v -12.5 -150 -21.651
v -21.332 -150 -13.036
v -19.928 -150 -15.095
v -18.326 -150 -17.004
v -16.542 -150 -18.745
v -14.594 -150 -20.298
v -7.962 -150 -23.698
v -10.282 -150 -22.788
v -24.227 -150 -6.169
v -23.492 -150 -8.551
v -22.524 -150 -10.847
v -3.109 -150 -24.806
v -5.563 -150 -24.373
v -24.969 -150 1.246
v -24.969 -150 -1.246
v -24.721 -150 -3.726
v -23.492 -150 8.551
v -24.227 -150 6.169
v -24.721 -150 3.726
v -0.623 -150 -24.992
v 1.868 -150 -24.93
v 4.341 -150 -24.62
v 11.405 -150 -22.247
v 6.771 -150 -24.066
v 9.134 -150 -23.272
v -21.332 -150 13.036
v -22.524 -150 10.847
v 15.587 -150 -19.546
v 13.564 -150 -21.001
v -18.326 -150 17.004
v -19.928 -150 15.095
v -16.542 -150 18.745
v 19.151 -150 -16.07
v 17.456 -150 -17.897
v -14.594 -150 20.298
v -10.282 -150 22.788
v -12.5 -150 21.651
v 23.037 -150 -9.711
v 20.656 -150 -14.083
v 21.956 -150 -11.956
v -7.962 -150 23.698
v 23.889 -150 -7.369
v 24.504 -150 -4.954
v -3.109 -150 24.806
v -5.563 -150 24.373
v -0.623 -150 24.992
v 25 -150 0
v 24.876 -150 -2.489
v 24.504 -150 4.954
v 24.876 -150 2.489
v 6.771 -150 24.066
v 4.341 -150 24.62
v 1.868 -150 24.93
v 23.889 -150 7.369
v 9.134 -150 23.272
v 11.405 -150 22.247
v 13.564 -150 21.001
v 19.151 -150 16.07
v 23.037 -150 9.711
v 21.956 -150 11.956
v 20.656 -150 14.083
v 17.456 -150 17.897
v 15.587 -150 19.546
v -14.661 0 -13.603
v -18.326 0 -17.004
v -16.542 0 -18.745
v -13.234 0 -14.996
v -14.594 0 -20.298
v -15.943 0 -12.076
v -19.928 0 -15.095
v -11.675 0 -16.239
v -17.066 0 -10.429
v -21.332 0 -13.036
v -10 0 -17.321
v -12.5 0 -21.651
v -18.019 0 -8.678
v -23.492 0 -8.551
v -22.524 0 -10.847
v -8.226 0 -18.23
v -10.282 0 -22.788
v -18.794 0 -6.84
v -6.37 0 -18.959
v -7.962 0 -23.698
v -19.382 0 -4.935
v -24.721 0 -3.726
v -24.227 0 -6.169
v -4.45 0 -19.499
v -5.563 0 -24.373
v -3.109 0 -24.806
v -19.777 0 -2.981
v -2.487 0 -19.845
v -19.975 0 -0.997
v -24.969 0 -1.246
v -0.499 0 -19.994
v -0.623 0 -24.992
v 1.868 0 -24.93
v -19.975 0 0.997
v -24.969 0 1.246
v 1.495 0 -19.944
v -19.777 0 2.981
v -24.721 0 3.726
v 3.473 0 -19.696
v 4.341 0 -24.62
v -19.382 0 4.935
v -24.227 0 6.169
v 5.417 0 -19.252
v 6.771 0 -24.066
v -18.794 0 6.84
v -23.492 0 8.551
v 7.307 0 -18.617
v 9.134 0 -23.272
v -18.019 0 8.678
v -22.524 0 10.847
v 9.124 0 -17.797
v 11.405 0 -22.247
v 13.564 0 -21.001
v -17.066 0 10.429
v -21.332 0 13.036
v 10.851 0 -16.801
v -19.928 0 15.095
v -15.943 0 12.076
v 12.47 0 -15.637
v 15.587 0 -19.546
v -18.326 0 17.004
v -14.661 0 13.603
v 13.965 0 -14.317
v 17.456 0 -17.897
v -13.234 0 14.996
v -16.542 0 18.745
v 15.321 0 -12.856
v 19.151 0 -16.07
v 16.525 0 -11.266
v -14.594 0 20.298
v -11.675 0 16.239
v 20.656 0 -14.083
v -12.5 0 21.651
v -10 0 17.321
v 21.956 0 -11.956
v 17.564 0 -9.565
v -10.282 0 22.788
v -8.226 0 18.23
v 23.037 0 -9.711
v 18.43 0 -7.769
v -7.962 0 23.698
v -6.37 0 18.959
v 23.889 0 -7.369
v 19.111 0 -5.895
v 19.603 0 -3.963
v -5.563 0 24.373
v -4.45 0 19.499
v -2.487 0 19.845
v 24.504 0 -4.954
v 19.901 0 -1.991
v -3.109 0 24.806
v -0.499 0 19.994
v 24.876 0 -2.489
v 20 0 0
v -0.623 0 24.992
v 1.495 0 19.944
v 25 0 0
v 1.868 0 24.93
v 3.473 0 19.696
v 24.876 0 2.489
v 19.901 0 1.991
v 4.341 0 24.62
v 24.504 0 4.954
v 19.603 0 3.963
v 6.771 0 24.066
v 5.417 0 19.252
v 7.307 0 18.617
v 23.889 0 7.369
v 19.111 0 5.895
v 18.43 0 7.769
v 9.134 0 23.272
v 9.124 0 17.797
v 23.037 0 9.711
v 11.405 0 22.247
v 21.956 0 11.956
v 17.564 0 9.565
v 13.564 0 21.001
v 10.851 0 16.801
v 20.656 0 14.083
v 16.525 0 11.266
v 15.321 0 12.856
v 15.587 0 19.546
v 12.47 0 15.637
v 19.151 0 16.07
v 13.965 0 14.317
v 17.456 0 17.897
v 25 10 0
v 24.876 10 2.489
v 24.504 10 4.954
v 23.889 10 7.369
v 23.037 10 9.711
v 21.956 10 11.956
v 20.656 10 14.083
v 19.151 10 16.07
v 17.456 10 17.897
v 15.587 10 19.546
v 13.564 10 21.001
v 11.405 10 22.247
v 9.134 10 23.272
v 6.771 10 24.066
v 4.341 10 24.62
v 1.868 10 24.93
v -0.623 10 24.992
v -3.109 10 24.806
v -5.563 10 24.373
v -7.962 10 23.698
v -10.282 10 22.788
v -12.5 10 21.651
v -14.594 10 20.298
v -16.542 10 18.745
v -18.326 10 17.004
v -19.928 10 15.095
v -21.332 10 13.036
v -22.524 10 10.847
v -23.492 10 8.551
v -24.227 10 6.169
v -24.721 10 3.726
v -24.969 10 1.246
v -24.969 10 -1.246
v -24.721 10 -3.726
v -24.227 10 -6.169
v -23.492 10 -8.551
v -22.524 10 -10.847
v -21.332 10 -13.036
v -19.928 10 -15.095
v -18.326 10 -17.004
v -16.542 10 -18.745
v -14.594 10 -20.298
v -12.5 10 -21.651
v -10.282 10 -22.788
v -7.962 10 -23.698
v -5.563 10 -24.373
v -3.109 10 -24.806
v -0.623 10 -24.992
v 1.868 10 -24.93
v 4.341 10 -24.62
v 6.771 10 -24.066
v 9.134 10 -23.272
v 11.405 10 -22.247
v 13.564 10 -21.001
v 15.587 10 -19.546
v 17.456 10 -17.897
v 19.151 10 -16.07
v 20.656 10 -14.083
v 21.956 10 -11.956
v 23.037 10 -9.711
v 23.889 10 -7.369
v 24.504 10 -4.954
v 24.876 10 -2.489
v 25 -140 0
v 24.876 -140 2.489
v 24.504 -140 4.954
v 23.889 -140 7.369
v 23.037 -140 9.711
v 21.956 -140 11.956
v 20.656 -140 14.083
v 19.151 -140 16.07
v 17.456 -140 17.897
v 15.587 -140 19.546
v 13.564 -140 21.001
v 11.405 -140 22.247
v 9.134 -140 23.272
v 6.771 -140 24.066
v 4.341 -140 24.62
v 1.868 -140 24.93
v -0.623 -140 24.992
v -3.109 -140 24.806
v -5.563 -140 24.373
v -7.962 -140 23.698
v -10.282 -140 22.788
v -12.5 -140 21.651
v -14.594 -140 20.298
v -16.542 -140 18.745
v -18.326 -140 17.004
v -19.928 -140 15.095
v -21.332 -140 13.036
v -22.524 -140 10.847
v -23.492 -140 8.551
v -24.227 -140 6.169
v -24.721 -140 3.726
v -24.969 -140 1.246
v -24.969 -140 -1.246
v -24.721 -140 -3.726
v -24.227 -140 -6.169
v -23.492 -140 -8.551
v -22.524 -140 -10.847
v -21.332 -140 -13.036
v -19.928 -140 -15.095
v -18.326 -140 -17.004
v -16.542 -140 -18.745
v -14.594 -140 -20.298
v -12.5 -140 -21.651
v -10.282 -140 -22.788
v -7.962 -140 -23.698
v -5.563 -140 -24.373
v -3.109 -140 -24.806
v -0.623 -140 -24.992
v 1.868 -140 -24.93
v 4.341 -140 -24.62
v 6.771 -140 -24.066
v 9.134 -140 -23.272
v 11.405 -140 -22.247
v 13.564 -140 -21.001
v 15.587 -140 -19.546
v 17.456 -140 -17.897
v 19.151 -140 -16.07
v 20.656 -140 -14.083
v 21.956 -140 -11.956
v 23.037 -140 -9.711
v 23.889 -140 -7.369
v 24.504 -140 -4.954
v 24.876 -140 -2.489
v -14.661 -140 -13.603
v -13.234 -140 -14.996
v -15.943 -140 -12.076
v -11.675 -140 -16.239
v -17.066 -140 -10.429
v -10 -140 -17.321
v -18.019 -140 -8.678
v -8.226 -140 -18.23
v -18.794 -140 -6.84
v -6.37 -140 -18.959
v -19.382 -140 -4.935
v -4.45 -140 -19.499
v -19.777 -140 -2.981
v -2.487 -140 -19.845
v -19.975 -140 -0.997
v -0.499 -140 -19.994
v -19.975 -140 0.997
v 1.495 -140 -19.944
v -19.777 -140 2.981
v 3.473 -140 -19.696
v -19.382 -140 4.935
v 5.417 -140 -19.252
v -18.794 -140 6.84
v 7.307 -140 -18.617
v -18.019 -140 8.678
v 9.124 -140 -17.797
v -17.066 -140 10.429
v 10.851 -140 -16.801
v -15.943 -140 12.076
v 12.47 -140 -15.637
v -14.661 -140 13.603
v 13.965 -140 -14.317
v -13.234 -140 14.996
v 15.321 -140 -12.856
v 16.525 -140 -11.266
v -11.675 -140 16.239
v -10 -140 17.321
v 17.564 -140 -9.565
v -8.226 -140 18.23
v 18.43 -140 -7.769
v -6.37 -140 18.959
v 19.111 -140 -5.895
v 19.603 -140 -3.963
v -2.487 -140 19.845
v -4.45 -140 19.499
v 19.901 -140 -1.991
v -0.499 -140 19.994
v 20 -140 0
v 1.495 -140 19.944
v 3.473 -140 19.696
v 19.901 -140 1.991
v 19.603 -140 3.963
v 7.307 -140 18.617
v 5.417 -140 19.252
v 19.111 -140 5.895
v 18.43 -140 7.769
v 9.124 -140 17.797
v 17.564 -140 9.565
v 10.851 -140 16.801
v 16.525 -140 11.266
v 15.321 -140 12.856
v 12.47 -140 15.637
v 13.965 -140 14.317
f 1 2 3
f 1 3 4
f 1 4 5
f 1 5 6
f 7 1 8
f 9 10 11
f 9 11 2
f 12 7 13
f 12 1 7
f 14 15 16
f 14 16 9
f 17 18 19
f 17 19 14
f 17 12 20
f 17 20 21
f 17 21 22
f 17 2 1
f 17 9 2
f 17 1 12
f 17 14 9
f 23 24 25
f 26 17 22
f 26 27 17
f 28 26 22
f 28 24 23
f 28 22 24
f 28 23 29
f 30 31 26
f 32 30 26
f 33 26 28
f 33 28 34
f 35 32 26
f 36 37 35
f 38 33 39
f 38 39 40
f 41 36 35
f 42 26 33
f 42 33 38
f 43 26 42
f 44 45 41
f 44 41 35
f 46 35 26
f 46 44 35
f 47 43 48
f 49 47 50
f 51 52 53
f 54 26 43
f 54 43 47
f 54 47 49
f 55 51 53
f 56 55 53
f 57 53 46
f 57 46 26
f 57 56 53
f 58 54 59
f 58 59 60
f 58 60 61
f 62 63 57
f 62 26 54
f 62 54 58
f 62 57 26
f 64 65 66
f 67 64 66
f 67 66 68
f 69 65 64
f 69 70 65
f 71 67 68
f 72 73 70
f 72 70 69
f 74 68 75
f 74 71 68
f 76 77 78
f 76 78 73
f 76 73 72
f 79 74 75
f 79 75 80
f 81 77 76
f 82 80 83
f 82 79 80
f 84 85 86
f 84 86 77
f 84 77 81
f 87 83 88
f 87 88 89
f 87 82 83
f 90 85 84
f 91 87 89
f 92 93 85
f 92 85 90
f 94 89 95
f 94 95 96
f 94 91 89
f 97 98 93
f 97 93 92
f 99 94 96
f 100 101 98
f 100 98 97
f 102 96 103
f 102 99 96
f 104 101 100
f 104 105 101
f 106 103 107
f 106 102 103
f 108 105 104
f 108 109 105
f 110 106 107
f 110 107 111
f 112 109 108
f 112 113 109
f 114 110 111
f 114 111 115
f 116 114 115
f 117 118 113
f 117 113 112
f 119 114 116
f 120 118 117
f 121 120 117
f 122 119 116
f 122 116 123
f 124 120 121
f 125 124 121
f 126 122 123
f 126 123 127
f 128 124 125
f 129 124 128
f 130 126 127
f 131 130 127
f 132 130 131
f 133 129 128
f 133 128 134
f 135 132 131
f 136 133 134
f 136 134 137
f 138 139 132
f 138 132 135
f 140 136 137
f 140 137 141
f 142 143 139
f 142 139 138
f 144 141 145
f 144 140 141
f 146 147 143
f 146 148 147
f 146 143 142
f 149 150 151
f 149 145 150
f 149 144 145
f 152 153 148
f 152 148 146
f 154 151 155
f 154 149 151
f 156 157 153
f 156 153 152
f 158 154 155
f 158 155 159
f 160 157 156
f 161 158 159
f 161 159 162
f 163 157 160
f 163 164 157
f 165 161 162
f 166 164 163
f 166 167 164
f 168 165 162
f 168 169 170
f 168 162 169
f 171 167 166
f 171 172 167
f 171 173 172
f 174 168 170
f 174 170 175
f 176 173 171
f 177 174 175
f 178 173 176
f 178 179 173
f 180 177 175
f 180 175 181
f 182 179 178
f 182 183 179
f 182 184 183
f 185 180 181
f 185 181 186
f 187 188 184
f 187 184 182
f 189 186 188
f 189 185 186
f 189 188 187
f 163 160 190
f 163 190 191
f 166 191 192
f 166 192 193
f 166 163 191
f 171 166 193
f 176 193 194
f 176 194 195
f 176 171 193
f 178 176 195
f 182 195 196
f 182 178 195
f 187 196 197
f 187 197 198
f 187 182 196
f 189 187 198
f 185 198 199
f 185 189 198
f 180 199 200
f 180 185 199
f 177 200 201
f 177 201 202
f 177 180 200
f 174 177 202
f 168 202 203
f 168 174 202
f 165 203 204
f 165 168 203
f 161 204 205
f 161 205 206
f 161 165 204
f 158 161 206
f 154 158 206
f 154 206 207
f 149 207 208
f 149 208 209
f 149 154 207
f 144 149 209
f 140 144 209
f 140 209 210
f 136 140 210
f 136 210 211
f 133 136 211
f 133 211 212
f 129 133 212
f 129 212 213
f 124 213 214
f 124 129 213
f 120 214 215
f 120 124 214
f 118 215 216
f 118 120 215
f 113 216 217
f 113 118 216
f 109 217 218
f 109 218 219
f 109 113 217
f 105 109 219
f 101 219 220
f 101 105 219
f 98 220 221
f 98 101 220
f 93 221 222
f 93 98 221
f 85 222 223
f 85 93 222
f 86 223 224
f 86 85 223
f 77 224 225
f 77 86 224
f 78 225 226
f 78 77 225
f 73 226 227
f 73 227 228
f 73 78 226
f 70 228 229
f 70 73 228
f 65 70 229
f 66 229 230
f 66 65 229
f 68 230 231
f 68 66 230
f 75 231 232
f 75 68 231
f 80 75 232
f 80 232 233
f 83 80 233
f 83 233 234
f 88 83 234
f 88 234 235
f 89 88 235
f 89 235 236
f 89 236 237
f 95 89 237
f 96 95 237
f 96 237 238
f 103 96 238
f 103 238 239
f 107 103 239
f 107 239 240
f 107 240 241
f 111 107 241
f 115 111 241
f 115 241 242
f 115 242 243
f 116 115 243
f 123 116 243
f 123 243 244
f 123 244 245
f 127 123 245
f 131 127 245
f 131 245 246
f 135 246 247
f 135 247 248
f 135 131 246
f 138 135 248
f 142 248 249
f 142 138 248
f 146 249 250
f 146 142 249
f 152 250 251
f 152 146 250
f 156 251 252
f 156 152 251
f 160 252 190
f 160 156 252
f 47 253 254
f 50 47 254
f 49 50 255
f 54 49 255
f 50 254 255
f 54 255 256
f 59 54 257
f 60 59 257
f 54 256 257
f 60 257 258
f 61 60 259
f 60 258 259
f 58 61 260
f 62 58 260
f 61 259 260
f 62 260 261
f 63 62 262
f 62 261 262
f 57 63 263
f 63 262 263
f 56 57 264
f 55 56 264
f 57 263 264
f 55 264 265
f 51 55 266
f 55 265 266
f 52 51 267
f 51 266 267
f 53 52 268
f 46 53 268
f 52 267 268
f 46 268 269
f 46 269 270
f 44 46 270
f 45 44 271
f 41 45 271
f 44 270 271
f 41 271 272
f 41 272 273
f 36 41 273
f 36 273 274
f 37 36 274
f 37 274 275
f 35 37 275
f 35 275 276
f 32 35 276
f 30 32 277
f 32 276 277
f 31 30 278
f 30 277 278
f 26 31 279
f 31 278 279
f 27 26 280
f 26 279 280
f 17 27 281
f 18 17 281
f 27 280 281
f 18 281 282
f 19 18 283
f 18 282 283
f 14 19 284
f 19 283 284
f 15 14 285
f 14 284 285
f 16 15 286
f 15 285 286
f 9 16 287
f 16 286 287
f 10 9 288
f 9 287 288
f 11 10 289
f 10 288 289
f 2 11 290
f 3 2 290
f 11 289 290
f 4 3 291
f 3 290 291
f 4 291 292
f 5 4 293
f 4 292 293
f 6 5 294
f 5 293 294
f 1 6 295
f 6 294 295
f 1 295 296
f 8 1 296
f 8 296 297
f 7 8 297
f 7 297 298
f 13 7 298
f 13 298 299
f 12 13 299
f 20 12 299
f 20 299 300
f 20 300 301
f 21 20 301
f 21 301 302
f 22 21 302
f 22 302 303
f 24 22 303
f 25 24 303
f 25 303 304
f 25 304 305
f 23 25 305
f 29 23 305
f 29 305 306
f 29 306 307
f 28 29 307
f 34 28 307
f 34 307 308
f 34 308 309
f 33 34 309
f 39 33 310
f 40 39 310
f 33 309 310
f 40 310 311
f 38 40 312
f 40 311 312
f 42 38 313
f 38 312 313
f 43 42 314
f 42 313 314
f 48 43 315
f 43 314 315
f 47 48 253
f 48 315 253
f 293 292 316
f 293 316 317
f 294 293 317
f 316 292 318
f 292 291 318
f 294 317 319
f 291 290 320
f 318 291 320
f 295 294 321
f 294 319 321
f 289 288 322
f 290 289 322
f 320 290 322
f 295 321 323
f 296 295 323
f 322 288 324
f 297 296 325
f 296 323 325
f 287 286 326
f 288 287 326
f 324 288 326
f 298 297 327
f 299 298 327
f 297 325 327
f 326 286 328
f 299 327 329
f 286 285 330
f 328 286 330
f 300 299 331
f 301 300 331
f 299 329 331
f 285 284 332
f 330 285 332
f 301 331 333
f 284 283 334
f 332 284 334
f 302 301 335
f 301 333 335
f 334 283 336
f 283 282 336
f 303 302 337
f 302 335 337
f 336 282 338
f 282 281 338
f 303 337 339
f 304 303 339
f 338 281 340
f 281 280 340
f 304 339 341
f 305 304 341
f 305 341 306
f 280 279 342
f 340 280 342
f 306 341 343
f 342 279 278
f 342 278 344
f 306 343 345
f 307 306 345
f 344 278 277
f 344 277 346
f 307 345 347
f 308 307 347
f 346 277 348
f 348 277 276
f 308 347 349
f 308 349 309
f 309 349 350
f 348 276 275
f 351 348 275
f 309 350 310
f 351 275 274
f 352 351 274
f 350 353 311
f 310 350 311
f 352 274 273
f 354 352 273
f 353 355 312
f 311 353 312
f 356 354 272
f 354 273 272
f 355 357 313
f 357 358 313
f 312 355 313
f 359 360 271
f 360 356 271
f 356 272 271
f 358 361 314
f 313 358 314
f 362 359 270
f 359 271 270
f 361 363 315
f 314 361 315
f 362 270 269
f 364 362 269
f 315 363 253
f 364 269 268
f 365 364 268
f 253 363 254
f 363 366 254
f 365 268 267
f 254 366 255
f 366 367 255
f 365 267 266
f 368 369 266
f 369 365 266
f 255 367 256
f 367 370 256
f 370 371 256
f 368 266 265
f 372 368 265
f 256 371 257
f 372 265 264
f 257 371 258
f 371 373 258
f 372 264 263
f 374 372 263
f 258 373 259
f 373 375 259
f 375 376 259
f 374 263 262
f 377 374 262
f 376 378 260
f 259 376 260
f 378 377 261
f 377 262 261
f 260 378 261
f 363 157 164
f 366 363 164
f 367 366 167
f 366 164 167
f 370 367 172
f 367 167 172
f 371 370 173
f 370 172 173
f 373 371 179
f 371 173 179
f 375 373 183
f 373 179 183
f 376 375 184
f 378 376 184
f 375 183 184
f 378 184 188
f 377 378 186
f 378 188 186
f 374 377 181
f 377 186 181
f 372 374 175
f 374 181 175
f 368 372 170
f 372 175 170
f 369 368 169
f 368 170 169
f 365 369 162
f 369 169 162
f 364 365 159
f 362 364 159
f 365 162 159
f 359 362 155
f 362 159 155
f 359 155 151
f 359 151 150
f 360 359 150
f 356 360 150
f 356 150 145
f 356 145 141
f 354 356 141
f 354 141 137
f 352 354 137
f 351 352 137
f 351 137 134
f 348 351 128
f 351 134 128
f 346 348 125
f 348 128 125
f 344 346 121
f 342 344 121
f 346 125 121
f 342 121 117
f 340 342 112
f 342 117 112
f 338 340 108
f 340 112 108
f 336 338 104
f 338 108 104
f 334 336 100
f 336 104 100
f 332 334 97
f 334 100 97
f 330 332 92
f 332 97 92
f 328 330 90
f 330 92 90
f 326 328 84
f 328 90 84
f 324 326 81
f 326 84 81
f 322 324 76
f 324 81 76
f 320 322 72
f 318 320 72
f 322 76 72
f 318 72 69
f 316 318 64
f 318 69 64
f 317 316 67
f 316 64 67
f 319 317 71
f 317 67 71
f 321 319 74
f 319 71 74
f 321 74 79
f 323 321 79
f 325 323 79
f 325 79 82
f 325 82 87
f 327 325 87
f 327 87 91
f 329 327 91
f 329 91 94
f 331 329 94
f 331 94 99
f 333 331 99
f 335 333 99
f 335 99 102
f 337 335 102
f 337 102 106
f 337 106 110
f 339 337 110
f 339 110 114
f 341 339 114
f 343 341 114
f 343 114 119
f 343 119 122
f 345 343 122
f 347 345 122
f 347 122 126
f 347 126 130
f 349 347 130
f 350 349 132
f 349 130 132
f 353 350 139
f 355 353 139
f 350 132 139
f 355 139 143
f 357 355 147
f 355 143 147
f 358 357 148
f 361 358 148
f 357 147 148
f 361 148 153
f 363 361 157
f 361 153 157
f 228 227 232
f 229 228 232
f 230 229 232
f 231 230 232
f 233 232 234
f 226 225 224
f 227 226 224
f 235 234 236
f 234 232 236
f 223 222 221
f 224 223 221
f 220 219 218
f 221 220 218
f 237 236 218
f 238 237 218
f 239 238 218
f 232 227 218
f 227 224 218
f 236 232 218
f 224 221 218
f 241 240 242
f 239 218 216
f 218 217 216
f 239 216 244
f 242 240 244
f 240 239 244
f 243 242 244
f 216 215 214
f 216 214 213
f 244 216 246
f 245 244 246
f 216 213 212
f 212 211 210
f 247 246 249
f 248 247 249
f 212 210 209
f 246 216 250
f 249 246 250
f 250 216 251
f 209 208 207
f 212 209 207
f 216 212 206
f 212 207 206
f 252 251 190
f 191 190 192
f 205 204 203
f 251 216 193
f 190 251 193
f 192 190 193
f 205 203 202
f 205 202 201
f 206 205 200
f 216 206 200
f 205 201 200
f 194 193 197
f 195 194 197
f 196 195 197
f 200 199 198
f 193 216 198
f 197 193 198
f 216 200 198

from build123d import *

# Parameters (mm, degrees)
F0_R     = 20
F1_DEPTH = 140
F0_R_2   = 25
F2_DEPTH = 10
F3_R     = 25
F4_DEPTH = 10


with BuildPart() as f1:
    # F0 (on Front) → F1 (new body)
    with BuildSketch(Plane.XZ):
        Circle(F0_R)
    extrude(amount=F1_DEPTH)

    # F0 (on Front) → F2 (join)
    with BuildSketch(Plane.XZ):
        Circle(F0_R_2)
        Circle(F0_R, mode=Mode.SUBTRACT)
        Circle(F0_R)
    extrude(amount=-F2_DEPTH)

    # F3 (on face) → F4 (join)
    with BuildSketch(Plane.XZ.offset(140)):
        Circle(F3_R)
    extrude(amount=F4_DEPTH)


solid = f1.part
